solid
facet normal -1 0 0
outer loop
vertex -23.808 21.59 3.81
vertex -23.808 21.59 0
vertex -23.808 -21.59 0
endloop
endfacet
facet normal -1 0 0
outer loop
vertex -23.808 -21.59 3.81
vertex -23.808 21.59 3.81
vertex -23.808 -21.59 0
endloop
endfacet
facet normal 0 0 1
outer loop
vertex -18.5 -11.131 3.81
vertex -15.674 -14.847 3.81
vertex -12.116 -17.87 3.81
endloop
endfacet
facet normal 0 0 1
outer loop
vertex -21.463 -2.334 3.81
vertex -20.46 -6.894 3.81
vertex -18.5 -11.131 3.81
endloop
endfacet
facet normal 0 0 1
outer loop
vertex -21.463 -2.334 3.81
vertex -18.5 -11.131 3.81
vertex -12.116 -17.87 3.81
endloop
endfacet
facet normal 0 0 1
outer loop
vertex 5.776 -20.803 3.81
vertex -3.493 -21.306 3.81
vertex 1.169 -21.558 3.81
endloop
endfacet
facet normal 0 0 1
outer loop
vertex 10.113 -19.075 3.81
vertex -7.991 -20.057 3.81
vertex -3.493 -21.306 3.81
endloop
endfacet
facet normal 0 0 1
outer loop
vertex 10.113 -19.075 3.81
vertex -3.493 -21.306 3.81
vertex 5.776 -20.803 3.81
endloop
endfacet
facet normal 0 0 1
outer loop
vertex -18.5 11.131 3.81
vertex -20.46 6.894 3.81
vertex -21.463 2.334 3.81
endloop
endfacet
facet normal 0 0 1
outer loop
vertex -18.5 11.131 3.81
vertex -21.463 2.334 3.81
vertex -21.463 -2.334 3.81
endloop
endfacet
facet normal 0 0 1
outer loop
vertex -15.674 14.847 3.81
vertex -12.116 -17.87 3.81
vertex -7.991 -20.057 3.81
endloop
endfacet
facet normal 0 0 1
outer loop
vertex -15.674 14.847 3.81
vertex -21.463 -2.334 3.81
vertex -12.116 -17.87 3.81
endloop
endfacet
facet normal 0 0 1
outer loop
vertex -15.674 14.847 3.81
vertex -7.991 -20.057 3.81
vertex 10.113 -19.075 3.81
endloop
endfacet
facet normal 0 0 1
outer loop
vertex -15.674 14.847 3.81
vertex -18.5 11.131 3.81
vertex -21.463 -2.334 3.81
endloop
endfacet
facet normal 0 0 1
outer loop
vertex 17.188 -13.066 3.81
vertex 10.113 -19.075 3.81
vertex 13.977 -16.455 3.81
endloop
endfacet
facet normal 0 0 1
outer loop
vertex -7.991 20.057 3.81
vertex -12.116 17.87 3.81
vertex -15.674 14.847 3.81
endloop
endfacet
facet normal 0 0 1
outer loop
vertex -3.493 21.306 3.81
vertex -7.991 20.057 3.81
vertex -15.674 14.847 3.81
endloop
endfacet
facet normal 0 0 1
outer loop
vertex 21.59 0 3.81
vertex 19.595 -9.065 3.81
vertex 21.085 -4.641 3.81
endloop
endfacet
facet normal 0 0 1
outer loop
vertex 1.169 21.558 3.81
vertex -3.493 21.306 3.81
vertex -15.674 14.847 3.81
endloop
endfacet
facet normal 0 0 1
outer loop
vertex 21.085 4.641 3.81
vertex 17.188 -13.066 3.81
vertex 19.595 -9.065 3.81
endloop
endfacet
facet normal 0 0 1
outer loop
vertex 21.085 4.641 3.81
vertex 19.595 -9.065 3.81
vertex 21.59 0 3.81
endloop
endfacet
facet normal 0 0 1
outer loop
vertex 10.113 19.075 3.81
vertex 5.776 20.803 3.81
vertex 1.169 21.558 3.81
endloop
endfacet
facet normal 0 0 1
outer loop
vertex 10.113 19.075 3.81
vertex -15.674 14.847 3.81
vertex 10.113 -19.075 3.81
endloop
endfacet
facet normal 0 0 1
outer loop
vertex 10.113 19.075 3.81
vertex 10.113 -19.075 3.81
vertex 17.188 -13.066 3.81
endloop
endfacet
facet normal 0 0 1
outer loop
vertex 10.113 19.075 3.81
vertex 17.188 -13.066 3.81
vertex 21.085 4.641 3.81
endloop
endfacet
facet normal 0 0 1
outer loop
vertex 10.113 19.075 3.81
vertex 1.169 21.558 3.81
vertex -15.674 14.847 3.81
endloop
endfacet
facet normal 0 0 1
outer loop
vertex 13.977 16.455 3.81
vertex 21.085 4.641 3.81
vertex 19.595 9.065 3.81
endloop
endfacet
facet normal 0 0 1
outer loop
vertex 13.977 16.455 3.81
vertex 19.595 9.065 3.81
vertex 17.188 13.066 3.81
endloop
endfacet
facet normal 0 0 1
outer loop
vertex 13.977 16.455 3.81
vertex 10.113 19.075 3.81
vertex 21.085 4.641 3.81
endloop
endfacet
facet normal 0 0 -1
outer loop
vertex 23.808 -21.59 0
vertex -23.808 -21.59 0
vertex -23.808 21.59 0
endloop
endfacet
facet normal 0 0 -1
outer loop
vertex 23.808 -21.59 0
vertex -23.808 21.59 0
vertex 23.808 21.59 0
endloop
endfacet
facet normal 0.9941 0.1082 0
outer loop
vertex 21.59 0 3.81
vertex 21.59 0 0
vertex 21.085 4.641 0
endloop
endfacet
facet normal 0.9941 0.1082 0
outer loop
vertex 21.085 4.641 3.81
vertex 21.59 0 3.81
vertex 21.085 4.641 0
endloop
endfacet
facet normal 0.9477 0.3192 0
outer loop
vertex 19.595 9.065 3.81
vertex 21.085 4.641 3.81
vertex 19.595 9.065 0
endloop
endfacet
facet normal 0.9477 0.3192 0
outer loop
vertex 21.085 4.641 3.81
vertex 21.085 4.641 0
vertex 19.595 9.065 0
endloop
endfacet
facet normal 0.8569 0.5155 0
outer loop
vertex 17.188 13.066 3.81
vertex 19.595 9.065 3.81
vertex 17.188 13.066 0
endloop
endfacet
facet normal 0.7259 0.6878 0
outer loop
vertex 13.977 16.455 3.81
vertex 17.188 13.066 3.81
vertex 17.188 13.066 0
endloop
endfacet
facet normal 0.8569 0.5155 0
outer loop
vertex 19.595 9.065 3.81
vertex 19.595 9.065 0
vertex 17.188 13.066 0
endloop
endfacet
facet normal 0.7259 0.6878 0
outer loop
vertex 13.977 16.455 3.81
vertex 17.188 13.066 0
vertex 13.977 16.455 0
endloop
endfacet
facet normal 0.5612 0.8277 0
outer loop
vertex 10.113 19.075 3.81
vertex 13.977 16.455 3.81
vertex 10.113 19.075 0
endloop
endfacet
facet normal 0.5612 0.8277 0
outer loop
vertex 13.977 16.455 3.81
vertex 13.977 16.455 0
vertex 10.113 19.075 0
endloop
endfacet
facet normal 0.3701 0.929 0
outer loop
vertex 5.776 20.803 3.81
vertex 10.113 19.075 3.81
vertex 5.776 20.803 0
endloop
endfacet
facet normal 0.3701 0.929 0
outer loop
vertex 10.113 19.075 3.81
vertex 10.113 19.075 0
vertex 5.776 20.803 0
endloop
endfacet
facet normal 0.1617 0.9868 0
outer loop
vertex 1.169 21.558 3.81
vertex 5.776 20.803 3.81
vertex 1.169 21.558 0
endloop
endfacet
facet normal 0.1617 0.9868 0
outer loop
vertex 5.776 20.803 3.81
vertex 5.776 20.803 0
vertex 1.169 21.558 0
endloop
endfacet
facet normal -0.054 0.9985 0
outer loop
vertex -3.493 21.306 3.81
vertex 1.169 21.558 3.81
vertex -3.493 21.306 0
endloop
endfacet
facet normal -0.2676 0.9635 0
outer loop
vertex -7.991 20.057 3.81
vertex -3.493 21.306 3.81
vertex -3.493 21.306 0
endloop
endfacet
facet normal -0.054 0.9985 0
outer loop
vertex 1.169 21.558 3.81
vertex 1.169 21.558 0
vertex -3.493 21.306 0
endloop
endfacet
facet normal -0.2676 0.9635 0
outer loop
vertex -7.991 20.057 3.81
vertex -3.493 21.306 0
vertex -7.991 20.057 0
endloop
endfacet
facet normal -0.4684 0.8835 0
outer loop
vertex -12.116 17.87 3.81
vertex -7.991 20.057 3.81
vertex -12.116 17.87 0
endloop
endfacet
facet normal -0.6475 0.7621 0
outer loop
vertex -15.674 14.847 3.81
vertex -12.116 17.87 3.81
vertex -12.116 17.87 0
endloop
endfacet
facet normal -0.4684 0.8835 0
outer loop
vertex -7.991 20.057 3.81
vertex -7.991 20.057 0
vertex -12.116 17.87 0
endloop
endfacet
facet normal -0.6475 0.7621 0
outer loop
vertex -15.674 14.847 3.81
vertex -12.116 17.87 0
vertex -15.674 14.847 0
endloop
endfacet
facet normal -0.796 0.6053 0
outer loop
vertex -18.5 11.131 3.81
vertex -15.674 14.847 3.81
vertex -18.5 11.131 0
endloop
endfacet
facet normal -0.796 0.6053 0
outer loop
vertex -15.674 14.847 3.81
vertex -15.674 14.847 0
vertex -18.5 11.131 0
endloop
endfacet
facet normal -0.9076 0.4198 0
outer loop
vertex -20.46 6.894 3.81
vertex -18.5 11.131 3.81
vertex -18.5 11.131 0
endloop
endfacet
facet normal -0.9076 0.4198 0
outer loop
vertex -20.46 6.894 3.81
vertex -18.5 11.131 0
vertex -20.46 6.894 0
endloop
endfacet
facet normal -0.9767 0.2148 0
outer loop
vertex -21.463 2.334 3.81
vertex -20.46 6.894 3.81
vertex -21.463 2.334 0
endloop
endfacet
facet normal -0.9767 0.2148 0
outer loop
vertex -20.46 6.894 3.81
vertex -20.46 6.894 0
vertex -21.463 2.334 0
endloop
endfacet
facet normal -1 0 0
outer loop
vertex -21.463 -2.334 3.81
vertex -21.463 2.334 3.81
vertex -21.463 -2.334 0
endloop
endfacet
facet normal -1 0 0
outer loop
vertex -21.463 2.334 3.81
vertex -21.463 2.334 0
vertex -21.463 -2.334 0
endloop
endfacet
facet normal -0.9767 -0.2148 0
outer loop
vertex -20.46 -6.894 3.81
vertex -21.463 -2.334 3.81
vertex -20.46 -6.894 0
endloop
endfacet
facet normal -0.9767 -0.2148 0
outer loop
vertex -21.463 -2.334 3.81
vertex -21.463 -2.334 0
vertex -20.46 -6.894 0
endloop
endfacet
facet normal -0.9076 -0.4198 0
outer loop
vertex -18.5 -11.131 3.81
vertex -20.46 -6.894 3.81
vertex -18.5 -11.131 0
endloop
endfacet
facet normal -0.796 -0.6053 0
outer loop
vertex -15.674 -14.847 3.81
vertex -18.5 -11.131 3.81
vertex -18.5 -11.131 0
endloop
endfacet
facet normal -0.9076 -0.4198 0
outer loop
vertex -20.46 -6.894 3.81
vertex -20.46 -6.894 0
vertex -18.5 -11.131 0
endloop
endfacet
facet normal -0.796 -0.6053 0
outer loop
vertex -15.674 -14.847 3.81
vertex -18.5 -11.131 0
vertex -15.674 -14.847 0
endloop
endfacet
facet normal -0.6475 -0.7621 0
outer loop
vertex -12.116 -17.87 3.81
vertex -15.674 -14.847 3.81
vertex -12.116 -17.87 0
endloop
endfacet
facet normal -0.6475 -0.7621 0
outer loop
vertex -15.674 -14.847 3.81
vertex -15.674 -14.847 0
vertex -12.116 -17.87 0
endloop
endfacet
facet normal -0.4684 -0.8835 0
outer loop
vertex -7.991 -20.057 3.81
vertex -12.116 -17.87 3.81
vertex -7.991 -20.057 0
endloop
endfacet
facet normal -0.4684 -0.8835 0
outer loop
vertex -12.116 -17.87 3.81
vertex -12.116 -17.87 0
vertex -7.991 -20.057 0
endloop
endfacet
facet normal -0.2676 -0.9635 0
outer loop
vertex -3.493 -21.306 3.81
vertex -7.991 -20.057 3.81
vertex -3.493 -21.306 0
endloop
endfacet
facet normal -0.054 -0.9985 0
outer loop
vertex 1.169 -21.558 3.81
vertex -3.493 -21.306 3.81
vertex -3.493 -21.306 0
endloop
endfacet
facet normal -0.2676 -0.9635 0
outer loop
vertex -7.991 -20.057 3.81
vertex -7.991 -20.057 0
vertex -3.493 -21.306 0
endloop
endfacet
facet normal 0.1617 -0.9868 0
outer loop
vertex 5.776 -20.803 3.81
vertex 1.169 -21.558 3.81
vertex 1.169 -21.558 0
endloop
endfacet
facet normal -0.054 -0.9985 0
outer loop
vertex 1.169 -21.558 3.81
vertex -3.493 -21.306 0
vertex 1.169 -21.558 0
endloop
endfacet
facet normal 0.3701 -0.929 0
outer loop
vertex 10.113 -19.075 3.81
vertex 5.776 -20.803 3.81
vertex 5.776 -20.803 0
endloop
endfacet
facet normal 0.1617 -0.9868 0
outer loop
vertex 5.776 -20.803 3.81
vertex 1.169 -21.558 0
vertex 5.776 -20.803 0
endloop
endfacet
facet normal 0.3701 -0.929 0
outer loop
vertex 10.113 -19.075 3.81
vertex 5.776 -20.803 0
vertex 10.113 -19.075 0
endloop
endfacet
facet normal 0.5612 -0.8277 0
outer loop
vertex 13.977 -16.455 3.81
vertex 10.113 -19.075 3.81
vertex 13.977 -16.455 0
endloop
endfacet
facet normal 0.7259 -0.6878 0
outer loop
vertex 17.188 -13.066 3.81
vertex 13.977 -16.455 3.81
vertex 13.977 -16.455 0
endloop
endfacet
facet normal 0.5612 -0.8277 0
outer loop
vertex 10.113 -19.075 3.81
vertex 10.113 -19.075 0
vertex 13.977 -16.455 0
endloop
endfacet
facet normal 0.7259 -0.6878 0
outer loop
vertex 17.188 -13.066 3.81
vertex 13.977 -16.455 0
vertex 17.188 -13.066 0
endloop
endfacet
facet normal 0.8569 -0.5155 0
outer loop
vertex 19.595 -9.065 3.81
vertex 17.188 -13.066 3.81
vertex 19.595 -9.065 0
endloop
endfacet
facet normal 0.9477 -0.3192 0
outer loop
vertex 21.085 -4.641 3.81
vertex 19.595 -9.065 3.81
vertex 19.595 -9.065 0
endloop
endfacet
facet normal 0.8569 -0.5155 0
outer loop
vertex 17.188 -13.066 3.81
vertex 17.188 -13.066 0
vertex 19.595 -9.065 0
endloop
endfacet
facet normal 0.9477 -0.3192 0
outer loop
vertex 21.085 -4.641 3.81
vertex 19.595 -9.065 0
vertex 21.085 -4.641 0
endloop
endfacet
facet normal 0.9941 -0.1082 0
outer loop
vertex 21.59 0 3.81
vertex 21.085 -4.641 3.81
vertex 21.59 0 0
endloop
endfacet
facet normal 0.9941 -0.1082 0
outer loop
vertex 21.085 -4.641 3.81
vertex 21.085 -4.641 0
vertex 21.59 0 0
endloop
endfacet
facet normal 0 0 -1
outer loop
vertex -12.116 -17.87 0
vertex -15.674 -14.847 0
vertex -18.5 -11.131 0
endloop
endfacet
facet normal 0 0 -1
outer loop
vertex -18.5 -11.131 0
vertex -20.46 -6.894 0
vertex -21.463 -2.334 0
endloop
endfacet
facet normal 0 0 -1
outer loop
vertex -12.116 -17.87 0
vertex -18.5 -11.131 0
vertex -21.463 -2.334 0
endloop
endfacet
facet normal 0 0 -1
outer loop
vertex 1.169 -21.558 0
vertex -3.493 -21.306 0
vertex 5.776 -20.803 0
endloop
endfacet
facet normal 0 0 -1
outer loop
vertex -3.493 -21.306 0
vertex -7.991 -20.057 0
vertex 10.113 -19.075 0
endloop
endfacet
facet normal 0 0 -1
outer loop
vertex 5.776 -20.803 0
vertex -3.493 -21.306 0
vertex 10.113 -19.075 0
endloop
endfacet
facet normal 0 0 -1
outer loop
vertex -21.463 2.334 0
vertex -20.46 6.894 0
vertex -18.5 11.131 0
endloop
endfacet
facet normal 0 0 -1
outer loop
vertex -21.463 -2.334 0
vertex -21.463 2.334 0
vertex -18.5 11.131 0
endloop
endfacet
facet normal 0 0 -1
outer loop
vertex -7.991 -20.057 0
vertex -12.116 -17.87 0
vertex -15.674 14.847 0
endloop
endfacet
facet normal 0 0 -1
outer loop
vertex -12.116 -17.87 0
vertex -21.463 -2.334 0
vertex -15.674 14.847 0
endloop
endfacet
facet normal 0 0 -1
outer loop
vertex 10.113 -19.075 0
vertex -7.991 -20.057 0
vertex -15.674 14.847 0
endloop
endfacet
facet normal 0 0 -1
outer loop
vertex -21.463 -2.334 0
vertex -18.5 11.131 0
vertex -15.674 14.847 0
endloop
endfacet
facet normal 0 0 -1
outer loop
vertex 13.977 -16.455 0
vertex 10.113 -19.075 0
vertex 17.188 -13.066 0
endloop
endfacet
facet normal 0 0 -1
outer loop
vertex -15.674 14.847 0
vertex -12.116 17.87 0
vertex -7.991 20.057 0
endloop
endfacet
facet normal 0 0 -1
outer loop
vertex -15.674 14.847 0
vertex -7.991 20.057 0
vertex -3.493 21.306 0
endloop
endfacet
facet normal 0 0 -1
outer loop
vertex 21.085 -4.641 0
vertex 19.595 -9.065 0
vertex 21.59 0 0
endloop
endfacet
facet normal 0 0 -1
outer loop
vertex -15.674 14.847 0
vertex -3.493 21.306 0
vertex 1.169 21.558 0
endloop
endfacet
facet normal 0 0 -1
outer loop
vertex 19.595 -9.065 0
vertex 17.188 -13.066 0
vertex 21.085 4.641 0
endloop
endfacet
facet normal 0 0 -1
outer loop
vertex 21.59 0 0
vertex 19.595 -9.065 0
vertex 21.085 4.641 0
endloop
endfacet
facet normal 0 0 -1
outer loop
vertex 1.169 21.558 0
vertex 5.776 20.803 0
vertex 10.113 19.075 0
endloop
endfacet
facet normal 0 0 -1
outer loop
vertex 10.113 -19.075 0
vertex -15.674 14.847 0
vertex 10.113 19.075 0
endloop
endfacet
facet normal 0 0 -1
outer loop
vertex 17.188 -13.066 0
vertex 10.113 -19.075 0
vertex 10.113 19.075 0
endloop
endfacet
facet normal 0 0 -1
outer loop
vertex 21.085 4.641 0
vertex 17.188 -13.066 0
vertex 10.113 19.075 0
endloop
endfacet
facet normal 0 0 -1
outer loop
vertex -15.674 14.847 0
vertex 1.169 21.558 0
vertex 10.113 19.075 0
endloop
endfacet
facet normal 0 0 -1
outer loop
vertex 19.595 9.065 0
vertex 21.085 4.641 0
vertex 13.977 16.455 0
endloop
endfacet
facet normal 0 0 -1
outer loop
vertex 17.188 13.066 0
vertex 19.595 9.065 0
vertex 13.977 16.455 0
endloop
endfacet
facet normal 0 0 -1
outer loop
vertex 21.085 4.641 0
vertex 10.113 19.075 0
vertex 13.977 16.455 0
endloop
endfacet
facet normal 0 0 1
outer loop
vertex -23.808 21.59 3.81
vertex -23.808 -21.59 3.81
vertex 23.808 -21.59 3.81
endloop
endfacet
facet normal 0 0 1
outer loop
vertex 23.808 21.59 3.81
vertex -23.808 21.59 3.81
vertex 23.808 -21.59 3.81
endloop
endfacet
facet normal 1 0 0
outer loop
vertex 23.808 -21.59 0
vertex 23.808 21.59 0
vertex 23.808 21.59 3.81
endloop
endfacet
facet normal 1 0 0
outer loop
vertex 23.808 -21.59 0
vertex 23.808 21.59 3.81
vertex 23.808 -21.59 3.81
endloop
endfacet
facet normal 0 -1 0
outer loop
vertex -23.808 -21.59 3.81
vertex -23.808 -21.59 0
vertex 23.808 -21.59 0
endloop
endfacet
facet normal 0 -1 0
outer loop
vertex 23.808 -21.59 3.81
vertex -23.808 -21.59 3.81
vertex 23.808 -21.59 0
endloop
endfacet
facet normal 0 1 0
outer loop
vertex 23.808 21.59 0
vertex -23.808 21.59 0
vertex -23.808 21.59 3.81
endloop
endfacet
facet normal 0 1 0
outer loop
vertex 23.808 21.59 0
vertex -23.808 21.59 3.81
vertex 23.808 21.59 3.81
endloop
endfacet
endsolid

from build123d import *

# Parameters (mm, degrees)
F0_R     = 21.59
F1_DEPTH = 3.81
F2_W     = 47.6150820366
F2_H     = 43.18
F3_DEPTH = 3.81


# Not quite as in the source:
# - a feature of the source that left no trace in its solid (it failed there, or was rolled back) is left out


with BuildPart() as f1:
    # F0 (on Top) → F1 (new body)
    with BuildSketch(Plane.XY):
        Circle(F0_R)
    extrude(amount=F1_DEPTH)


with BuildPart() as f3:
    # F2 (on face) → F3 (new body)
    with BuildSketch(Plane(origin=(0, 0, 0), x_dir=(1, 0, 0), z_dir=(0, 0, -1))):
        Rectangle(F2_W, F2_H)
    extrude(amount=-F3_DEPTH)


solid = Compound([f1.part, f3.part])
